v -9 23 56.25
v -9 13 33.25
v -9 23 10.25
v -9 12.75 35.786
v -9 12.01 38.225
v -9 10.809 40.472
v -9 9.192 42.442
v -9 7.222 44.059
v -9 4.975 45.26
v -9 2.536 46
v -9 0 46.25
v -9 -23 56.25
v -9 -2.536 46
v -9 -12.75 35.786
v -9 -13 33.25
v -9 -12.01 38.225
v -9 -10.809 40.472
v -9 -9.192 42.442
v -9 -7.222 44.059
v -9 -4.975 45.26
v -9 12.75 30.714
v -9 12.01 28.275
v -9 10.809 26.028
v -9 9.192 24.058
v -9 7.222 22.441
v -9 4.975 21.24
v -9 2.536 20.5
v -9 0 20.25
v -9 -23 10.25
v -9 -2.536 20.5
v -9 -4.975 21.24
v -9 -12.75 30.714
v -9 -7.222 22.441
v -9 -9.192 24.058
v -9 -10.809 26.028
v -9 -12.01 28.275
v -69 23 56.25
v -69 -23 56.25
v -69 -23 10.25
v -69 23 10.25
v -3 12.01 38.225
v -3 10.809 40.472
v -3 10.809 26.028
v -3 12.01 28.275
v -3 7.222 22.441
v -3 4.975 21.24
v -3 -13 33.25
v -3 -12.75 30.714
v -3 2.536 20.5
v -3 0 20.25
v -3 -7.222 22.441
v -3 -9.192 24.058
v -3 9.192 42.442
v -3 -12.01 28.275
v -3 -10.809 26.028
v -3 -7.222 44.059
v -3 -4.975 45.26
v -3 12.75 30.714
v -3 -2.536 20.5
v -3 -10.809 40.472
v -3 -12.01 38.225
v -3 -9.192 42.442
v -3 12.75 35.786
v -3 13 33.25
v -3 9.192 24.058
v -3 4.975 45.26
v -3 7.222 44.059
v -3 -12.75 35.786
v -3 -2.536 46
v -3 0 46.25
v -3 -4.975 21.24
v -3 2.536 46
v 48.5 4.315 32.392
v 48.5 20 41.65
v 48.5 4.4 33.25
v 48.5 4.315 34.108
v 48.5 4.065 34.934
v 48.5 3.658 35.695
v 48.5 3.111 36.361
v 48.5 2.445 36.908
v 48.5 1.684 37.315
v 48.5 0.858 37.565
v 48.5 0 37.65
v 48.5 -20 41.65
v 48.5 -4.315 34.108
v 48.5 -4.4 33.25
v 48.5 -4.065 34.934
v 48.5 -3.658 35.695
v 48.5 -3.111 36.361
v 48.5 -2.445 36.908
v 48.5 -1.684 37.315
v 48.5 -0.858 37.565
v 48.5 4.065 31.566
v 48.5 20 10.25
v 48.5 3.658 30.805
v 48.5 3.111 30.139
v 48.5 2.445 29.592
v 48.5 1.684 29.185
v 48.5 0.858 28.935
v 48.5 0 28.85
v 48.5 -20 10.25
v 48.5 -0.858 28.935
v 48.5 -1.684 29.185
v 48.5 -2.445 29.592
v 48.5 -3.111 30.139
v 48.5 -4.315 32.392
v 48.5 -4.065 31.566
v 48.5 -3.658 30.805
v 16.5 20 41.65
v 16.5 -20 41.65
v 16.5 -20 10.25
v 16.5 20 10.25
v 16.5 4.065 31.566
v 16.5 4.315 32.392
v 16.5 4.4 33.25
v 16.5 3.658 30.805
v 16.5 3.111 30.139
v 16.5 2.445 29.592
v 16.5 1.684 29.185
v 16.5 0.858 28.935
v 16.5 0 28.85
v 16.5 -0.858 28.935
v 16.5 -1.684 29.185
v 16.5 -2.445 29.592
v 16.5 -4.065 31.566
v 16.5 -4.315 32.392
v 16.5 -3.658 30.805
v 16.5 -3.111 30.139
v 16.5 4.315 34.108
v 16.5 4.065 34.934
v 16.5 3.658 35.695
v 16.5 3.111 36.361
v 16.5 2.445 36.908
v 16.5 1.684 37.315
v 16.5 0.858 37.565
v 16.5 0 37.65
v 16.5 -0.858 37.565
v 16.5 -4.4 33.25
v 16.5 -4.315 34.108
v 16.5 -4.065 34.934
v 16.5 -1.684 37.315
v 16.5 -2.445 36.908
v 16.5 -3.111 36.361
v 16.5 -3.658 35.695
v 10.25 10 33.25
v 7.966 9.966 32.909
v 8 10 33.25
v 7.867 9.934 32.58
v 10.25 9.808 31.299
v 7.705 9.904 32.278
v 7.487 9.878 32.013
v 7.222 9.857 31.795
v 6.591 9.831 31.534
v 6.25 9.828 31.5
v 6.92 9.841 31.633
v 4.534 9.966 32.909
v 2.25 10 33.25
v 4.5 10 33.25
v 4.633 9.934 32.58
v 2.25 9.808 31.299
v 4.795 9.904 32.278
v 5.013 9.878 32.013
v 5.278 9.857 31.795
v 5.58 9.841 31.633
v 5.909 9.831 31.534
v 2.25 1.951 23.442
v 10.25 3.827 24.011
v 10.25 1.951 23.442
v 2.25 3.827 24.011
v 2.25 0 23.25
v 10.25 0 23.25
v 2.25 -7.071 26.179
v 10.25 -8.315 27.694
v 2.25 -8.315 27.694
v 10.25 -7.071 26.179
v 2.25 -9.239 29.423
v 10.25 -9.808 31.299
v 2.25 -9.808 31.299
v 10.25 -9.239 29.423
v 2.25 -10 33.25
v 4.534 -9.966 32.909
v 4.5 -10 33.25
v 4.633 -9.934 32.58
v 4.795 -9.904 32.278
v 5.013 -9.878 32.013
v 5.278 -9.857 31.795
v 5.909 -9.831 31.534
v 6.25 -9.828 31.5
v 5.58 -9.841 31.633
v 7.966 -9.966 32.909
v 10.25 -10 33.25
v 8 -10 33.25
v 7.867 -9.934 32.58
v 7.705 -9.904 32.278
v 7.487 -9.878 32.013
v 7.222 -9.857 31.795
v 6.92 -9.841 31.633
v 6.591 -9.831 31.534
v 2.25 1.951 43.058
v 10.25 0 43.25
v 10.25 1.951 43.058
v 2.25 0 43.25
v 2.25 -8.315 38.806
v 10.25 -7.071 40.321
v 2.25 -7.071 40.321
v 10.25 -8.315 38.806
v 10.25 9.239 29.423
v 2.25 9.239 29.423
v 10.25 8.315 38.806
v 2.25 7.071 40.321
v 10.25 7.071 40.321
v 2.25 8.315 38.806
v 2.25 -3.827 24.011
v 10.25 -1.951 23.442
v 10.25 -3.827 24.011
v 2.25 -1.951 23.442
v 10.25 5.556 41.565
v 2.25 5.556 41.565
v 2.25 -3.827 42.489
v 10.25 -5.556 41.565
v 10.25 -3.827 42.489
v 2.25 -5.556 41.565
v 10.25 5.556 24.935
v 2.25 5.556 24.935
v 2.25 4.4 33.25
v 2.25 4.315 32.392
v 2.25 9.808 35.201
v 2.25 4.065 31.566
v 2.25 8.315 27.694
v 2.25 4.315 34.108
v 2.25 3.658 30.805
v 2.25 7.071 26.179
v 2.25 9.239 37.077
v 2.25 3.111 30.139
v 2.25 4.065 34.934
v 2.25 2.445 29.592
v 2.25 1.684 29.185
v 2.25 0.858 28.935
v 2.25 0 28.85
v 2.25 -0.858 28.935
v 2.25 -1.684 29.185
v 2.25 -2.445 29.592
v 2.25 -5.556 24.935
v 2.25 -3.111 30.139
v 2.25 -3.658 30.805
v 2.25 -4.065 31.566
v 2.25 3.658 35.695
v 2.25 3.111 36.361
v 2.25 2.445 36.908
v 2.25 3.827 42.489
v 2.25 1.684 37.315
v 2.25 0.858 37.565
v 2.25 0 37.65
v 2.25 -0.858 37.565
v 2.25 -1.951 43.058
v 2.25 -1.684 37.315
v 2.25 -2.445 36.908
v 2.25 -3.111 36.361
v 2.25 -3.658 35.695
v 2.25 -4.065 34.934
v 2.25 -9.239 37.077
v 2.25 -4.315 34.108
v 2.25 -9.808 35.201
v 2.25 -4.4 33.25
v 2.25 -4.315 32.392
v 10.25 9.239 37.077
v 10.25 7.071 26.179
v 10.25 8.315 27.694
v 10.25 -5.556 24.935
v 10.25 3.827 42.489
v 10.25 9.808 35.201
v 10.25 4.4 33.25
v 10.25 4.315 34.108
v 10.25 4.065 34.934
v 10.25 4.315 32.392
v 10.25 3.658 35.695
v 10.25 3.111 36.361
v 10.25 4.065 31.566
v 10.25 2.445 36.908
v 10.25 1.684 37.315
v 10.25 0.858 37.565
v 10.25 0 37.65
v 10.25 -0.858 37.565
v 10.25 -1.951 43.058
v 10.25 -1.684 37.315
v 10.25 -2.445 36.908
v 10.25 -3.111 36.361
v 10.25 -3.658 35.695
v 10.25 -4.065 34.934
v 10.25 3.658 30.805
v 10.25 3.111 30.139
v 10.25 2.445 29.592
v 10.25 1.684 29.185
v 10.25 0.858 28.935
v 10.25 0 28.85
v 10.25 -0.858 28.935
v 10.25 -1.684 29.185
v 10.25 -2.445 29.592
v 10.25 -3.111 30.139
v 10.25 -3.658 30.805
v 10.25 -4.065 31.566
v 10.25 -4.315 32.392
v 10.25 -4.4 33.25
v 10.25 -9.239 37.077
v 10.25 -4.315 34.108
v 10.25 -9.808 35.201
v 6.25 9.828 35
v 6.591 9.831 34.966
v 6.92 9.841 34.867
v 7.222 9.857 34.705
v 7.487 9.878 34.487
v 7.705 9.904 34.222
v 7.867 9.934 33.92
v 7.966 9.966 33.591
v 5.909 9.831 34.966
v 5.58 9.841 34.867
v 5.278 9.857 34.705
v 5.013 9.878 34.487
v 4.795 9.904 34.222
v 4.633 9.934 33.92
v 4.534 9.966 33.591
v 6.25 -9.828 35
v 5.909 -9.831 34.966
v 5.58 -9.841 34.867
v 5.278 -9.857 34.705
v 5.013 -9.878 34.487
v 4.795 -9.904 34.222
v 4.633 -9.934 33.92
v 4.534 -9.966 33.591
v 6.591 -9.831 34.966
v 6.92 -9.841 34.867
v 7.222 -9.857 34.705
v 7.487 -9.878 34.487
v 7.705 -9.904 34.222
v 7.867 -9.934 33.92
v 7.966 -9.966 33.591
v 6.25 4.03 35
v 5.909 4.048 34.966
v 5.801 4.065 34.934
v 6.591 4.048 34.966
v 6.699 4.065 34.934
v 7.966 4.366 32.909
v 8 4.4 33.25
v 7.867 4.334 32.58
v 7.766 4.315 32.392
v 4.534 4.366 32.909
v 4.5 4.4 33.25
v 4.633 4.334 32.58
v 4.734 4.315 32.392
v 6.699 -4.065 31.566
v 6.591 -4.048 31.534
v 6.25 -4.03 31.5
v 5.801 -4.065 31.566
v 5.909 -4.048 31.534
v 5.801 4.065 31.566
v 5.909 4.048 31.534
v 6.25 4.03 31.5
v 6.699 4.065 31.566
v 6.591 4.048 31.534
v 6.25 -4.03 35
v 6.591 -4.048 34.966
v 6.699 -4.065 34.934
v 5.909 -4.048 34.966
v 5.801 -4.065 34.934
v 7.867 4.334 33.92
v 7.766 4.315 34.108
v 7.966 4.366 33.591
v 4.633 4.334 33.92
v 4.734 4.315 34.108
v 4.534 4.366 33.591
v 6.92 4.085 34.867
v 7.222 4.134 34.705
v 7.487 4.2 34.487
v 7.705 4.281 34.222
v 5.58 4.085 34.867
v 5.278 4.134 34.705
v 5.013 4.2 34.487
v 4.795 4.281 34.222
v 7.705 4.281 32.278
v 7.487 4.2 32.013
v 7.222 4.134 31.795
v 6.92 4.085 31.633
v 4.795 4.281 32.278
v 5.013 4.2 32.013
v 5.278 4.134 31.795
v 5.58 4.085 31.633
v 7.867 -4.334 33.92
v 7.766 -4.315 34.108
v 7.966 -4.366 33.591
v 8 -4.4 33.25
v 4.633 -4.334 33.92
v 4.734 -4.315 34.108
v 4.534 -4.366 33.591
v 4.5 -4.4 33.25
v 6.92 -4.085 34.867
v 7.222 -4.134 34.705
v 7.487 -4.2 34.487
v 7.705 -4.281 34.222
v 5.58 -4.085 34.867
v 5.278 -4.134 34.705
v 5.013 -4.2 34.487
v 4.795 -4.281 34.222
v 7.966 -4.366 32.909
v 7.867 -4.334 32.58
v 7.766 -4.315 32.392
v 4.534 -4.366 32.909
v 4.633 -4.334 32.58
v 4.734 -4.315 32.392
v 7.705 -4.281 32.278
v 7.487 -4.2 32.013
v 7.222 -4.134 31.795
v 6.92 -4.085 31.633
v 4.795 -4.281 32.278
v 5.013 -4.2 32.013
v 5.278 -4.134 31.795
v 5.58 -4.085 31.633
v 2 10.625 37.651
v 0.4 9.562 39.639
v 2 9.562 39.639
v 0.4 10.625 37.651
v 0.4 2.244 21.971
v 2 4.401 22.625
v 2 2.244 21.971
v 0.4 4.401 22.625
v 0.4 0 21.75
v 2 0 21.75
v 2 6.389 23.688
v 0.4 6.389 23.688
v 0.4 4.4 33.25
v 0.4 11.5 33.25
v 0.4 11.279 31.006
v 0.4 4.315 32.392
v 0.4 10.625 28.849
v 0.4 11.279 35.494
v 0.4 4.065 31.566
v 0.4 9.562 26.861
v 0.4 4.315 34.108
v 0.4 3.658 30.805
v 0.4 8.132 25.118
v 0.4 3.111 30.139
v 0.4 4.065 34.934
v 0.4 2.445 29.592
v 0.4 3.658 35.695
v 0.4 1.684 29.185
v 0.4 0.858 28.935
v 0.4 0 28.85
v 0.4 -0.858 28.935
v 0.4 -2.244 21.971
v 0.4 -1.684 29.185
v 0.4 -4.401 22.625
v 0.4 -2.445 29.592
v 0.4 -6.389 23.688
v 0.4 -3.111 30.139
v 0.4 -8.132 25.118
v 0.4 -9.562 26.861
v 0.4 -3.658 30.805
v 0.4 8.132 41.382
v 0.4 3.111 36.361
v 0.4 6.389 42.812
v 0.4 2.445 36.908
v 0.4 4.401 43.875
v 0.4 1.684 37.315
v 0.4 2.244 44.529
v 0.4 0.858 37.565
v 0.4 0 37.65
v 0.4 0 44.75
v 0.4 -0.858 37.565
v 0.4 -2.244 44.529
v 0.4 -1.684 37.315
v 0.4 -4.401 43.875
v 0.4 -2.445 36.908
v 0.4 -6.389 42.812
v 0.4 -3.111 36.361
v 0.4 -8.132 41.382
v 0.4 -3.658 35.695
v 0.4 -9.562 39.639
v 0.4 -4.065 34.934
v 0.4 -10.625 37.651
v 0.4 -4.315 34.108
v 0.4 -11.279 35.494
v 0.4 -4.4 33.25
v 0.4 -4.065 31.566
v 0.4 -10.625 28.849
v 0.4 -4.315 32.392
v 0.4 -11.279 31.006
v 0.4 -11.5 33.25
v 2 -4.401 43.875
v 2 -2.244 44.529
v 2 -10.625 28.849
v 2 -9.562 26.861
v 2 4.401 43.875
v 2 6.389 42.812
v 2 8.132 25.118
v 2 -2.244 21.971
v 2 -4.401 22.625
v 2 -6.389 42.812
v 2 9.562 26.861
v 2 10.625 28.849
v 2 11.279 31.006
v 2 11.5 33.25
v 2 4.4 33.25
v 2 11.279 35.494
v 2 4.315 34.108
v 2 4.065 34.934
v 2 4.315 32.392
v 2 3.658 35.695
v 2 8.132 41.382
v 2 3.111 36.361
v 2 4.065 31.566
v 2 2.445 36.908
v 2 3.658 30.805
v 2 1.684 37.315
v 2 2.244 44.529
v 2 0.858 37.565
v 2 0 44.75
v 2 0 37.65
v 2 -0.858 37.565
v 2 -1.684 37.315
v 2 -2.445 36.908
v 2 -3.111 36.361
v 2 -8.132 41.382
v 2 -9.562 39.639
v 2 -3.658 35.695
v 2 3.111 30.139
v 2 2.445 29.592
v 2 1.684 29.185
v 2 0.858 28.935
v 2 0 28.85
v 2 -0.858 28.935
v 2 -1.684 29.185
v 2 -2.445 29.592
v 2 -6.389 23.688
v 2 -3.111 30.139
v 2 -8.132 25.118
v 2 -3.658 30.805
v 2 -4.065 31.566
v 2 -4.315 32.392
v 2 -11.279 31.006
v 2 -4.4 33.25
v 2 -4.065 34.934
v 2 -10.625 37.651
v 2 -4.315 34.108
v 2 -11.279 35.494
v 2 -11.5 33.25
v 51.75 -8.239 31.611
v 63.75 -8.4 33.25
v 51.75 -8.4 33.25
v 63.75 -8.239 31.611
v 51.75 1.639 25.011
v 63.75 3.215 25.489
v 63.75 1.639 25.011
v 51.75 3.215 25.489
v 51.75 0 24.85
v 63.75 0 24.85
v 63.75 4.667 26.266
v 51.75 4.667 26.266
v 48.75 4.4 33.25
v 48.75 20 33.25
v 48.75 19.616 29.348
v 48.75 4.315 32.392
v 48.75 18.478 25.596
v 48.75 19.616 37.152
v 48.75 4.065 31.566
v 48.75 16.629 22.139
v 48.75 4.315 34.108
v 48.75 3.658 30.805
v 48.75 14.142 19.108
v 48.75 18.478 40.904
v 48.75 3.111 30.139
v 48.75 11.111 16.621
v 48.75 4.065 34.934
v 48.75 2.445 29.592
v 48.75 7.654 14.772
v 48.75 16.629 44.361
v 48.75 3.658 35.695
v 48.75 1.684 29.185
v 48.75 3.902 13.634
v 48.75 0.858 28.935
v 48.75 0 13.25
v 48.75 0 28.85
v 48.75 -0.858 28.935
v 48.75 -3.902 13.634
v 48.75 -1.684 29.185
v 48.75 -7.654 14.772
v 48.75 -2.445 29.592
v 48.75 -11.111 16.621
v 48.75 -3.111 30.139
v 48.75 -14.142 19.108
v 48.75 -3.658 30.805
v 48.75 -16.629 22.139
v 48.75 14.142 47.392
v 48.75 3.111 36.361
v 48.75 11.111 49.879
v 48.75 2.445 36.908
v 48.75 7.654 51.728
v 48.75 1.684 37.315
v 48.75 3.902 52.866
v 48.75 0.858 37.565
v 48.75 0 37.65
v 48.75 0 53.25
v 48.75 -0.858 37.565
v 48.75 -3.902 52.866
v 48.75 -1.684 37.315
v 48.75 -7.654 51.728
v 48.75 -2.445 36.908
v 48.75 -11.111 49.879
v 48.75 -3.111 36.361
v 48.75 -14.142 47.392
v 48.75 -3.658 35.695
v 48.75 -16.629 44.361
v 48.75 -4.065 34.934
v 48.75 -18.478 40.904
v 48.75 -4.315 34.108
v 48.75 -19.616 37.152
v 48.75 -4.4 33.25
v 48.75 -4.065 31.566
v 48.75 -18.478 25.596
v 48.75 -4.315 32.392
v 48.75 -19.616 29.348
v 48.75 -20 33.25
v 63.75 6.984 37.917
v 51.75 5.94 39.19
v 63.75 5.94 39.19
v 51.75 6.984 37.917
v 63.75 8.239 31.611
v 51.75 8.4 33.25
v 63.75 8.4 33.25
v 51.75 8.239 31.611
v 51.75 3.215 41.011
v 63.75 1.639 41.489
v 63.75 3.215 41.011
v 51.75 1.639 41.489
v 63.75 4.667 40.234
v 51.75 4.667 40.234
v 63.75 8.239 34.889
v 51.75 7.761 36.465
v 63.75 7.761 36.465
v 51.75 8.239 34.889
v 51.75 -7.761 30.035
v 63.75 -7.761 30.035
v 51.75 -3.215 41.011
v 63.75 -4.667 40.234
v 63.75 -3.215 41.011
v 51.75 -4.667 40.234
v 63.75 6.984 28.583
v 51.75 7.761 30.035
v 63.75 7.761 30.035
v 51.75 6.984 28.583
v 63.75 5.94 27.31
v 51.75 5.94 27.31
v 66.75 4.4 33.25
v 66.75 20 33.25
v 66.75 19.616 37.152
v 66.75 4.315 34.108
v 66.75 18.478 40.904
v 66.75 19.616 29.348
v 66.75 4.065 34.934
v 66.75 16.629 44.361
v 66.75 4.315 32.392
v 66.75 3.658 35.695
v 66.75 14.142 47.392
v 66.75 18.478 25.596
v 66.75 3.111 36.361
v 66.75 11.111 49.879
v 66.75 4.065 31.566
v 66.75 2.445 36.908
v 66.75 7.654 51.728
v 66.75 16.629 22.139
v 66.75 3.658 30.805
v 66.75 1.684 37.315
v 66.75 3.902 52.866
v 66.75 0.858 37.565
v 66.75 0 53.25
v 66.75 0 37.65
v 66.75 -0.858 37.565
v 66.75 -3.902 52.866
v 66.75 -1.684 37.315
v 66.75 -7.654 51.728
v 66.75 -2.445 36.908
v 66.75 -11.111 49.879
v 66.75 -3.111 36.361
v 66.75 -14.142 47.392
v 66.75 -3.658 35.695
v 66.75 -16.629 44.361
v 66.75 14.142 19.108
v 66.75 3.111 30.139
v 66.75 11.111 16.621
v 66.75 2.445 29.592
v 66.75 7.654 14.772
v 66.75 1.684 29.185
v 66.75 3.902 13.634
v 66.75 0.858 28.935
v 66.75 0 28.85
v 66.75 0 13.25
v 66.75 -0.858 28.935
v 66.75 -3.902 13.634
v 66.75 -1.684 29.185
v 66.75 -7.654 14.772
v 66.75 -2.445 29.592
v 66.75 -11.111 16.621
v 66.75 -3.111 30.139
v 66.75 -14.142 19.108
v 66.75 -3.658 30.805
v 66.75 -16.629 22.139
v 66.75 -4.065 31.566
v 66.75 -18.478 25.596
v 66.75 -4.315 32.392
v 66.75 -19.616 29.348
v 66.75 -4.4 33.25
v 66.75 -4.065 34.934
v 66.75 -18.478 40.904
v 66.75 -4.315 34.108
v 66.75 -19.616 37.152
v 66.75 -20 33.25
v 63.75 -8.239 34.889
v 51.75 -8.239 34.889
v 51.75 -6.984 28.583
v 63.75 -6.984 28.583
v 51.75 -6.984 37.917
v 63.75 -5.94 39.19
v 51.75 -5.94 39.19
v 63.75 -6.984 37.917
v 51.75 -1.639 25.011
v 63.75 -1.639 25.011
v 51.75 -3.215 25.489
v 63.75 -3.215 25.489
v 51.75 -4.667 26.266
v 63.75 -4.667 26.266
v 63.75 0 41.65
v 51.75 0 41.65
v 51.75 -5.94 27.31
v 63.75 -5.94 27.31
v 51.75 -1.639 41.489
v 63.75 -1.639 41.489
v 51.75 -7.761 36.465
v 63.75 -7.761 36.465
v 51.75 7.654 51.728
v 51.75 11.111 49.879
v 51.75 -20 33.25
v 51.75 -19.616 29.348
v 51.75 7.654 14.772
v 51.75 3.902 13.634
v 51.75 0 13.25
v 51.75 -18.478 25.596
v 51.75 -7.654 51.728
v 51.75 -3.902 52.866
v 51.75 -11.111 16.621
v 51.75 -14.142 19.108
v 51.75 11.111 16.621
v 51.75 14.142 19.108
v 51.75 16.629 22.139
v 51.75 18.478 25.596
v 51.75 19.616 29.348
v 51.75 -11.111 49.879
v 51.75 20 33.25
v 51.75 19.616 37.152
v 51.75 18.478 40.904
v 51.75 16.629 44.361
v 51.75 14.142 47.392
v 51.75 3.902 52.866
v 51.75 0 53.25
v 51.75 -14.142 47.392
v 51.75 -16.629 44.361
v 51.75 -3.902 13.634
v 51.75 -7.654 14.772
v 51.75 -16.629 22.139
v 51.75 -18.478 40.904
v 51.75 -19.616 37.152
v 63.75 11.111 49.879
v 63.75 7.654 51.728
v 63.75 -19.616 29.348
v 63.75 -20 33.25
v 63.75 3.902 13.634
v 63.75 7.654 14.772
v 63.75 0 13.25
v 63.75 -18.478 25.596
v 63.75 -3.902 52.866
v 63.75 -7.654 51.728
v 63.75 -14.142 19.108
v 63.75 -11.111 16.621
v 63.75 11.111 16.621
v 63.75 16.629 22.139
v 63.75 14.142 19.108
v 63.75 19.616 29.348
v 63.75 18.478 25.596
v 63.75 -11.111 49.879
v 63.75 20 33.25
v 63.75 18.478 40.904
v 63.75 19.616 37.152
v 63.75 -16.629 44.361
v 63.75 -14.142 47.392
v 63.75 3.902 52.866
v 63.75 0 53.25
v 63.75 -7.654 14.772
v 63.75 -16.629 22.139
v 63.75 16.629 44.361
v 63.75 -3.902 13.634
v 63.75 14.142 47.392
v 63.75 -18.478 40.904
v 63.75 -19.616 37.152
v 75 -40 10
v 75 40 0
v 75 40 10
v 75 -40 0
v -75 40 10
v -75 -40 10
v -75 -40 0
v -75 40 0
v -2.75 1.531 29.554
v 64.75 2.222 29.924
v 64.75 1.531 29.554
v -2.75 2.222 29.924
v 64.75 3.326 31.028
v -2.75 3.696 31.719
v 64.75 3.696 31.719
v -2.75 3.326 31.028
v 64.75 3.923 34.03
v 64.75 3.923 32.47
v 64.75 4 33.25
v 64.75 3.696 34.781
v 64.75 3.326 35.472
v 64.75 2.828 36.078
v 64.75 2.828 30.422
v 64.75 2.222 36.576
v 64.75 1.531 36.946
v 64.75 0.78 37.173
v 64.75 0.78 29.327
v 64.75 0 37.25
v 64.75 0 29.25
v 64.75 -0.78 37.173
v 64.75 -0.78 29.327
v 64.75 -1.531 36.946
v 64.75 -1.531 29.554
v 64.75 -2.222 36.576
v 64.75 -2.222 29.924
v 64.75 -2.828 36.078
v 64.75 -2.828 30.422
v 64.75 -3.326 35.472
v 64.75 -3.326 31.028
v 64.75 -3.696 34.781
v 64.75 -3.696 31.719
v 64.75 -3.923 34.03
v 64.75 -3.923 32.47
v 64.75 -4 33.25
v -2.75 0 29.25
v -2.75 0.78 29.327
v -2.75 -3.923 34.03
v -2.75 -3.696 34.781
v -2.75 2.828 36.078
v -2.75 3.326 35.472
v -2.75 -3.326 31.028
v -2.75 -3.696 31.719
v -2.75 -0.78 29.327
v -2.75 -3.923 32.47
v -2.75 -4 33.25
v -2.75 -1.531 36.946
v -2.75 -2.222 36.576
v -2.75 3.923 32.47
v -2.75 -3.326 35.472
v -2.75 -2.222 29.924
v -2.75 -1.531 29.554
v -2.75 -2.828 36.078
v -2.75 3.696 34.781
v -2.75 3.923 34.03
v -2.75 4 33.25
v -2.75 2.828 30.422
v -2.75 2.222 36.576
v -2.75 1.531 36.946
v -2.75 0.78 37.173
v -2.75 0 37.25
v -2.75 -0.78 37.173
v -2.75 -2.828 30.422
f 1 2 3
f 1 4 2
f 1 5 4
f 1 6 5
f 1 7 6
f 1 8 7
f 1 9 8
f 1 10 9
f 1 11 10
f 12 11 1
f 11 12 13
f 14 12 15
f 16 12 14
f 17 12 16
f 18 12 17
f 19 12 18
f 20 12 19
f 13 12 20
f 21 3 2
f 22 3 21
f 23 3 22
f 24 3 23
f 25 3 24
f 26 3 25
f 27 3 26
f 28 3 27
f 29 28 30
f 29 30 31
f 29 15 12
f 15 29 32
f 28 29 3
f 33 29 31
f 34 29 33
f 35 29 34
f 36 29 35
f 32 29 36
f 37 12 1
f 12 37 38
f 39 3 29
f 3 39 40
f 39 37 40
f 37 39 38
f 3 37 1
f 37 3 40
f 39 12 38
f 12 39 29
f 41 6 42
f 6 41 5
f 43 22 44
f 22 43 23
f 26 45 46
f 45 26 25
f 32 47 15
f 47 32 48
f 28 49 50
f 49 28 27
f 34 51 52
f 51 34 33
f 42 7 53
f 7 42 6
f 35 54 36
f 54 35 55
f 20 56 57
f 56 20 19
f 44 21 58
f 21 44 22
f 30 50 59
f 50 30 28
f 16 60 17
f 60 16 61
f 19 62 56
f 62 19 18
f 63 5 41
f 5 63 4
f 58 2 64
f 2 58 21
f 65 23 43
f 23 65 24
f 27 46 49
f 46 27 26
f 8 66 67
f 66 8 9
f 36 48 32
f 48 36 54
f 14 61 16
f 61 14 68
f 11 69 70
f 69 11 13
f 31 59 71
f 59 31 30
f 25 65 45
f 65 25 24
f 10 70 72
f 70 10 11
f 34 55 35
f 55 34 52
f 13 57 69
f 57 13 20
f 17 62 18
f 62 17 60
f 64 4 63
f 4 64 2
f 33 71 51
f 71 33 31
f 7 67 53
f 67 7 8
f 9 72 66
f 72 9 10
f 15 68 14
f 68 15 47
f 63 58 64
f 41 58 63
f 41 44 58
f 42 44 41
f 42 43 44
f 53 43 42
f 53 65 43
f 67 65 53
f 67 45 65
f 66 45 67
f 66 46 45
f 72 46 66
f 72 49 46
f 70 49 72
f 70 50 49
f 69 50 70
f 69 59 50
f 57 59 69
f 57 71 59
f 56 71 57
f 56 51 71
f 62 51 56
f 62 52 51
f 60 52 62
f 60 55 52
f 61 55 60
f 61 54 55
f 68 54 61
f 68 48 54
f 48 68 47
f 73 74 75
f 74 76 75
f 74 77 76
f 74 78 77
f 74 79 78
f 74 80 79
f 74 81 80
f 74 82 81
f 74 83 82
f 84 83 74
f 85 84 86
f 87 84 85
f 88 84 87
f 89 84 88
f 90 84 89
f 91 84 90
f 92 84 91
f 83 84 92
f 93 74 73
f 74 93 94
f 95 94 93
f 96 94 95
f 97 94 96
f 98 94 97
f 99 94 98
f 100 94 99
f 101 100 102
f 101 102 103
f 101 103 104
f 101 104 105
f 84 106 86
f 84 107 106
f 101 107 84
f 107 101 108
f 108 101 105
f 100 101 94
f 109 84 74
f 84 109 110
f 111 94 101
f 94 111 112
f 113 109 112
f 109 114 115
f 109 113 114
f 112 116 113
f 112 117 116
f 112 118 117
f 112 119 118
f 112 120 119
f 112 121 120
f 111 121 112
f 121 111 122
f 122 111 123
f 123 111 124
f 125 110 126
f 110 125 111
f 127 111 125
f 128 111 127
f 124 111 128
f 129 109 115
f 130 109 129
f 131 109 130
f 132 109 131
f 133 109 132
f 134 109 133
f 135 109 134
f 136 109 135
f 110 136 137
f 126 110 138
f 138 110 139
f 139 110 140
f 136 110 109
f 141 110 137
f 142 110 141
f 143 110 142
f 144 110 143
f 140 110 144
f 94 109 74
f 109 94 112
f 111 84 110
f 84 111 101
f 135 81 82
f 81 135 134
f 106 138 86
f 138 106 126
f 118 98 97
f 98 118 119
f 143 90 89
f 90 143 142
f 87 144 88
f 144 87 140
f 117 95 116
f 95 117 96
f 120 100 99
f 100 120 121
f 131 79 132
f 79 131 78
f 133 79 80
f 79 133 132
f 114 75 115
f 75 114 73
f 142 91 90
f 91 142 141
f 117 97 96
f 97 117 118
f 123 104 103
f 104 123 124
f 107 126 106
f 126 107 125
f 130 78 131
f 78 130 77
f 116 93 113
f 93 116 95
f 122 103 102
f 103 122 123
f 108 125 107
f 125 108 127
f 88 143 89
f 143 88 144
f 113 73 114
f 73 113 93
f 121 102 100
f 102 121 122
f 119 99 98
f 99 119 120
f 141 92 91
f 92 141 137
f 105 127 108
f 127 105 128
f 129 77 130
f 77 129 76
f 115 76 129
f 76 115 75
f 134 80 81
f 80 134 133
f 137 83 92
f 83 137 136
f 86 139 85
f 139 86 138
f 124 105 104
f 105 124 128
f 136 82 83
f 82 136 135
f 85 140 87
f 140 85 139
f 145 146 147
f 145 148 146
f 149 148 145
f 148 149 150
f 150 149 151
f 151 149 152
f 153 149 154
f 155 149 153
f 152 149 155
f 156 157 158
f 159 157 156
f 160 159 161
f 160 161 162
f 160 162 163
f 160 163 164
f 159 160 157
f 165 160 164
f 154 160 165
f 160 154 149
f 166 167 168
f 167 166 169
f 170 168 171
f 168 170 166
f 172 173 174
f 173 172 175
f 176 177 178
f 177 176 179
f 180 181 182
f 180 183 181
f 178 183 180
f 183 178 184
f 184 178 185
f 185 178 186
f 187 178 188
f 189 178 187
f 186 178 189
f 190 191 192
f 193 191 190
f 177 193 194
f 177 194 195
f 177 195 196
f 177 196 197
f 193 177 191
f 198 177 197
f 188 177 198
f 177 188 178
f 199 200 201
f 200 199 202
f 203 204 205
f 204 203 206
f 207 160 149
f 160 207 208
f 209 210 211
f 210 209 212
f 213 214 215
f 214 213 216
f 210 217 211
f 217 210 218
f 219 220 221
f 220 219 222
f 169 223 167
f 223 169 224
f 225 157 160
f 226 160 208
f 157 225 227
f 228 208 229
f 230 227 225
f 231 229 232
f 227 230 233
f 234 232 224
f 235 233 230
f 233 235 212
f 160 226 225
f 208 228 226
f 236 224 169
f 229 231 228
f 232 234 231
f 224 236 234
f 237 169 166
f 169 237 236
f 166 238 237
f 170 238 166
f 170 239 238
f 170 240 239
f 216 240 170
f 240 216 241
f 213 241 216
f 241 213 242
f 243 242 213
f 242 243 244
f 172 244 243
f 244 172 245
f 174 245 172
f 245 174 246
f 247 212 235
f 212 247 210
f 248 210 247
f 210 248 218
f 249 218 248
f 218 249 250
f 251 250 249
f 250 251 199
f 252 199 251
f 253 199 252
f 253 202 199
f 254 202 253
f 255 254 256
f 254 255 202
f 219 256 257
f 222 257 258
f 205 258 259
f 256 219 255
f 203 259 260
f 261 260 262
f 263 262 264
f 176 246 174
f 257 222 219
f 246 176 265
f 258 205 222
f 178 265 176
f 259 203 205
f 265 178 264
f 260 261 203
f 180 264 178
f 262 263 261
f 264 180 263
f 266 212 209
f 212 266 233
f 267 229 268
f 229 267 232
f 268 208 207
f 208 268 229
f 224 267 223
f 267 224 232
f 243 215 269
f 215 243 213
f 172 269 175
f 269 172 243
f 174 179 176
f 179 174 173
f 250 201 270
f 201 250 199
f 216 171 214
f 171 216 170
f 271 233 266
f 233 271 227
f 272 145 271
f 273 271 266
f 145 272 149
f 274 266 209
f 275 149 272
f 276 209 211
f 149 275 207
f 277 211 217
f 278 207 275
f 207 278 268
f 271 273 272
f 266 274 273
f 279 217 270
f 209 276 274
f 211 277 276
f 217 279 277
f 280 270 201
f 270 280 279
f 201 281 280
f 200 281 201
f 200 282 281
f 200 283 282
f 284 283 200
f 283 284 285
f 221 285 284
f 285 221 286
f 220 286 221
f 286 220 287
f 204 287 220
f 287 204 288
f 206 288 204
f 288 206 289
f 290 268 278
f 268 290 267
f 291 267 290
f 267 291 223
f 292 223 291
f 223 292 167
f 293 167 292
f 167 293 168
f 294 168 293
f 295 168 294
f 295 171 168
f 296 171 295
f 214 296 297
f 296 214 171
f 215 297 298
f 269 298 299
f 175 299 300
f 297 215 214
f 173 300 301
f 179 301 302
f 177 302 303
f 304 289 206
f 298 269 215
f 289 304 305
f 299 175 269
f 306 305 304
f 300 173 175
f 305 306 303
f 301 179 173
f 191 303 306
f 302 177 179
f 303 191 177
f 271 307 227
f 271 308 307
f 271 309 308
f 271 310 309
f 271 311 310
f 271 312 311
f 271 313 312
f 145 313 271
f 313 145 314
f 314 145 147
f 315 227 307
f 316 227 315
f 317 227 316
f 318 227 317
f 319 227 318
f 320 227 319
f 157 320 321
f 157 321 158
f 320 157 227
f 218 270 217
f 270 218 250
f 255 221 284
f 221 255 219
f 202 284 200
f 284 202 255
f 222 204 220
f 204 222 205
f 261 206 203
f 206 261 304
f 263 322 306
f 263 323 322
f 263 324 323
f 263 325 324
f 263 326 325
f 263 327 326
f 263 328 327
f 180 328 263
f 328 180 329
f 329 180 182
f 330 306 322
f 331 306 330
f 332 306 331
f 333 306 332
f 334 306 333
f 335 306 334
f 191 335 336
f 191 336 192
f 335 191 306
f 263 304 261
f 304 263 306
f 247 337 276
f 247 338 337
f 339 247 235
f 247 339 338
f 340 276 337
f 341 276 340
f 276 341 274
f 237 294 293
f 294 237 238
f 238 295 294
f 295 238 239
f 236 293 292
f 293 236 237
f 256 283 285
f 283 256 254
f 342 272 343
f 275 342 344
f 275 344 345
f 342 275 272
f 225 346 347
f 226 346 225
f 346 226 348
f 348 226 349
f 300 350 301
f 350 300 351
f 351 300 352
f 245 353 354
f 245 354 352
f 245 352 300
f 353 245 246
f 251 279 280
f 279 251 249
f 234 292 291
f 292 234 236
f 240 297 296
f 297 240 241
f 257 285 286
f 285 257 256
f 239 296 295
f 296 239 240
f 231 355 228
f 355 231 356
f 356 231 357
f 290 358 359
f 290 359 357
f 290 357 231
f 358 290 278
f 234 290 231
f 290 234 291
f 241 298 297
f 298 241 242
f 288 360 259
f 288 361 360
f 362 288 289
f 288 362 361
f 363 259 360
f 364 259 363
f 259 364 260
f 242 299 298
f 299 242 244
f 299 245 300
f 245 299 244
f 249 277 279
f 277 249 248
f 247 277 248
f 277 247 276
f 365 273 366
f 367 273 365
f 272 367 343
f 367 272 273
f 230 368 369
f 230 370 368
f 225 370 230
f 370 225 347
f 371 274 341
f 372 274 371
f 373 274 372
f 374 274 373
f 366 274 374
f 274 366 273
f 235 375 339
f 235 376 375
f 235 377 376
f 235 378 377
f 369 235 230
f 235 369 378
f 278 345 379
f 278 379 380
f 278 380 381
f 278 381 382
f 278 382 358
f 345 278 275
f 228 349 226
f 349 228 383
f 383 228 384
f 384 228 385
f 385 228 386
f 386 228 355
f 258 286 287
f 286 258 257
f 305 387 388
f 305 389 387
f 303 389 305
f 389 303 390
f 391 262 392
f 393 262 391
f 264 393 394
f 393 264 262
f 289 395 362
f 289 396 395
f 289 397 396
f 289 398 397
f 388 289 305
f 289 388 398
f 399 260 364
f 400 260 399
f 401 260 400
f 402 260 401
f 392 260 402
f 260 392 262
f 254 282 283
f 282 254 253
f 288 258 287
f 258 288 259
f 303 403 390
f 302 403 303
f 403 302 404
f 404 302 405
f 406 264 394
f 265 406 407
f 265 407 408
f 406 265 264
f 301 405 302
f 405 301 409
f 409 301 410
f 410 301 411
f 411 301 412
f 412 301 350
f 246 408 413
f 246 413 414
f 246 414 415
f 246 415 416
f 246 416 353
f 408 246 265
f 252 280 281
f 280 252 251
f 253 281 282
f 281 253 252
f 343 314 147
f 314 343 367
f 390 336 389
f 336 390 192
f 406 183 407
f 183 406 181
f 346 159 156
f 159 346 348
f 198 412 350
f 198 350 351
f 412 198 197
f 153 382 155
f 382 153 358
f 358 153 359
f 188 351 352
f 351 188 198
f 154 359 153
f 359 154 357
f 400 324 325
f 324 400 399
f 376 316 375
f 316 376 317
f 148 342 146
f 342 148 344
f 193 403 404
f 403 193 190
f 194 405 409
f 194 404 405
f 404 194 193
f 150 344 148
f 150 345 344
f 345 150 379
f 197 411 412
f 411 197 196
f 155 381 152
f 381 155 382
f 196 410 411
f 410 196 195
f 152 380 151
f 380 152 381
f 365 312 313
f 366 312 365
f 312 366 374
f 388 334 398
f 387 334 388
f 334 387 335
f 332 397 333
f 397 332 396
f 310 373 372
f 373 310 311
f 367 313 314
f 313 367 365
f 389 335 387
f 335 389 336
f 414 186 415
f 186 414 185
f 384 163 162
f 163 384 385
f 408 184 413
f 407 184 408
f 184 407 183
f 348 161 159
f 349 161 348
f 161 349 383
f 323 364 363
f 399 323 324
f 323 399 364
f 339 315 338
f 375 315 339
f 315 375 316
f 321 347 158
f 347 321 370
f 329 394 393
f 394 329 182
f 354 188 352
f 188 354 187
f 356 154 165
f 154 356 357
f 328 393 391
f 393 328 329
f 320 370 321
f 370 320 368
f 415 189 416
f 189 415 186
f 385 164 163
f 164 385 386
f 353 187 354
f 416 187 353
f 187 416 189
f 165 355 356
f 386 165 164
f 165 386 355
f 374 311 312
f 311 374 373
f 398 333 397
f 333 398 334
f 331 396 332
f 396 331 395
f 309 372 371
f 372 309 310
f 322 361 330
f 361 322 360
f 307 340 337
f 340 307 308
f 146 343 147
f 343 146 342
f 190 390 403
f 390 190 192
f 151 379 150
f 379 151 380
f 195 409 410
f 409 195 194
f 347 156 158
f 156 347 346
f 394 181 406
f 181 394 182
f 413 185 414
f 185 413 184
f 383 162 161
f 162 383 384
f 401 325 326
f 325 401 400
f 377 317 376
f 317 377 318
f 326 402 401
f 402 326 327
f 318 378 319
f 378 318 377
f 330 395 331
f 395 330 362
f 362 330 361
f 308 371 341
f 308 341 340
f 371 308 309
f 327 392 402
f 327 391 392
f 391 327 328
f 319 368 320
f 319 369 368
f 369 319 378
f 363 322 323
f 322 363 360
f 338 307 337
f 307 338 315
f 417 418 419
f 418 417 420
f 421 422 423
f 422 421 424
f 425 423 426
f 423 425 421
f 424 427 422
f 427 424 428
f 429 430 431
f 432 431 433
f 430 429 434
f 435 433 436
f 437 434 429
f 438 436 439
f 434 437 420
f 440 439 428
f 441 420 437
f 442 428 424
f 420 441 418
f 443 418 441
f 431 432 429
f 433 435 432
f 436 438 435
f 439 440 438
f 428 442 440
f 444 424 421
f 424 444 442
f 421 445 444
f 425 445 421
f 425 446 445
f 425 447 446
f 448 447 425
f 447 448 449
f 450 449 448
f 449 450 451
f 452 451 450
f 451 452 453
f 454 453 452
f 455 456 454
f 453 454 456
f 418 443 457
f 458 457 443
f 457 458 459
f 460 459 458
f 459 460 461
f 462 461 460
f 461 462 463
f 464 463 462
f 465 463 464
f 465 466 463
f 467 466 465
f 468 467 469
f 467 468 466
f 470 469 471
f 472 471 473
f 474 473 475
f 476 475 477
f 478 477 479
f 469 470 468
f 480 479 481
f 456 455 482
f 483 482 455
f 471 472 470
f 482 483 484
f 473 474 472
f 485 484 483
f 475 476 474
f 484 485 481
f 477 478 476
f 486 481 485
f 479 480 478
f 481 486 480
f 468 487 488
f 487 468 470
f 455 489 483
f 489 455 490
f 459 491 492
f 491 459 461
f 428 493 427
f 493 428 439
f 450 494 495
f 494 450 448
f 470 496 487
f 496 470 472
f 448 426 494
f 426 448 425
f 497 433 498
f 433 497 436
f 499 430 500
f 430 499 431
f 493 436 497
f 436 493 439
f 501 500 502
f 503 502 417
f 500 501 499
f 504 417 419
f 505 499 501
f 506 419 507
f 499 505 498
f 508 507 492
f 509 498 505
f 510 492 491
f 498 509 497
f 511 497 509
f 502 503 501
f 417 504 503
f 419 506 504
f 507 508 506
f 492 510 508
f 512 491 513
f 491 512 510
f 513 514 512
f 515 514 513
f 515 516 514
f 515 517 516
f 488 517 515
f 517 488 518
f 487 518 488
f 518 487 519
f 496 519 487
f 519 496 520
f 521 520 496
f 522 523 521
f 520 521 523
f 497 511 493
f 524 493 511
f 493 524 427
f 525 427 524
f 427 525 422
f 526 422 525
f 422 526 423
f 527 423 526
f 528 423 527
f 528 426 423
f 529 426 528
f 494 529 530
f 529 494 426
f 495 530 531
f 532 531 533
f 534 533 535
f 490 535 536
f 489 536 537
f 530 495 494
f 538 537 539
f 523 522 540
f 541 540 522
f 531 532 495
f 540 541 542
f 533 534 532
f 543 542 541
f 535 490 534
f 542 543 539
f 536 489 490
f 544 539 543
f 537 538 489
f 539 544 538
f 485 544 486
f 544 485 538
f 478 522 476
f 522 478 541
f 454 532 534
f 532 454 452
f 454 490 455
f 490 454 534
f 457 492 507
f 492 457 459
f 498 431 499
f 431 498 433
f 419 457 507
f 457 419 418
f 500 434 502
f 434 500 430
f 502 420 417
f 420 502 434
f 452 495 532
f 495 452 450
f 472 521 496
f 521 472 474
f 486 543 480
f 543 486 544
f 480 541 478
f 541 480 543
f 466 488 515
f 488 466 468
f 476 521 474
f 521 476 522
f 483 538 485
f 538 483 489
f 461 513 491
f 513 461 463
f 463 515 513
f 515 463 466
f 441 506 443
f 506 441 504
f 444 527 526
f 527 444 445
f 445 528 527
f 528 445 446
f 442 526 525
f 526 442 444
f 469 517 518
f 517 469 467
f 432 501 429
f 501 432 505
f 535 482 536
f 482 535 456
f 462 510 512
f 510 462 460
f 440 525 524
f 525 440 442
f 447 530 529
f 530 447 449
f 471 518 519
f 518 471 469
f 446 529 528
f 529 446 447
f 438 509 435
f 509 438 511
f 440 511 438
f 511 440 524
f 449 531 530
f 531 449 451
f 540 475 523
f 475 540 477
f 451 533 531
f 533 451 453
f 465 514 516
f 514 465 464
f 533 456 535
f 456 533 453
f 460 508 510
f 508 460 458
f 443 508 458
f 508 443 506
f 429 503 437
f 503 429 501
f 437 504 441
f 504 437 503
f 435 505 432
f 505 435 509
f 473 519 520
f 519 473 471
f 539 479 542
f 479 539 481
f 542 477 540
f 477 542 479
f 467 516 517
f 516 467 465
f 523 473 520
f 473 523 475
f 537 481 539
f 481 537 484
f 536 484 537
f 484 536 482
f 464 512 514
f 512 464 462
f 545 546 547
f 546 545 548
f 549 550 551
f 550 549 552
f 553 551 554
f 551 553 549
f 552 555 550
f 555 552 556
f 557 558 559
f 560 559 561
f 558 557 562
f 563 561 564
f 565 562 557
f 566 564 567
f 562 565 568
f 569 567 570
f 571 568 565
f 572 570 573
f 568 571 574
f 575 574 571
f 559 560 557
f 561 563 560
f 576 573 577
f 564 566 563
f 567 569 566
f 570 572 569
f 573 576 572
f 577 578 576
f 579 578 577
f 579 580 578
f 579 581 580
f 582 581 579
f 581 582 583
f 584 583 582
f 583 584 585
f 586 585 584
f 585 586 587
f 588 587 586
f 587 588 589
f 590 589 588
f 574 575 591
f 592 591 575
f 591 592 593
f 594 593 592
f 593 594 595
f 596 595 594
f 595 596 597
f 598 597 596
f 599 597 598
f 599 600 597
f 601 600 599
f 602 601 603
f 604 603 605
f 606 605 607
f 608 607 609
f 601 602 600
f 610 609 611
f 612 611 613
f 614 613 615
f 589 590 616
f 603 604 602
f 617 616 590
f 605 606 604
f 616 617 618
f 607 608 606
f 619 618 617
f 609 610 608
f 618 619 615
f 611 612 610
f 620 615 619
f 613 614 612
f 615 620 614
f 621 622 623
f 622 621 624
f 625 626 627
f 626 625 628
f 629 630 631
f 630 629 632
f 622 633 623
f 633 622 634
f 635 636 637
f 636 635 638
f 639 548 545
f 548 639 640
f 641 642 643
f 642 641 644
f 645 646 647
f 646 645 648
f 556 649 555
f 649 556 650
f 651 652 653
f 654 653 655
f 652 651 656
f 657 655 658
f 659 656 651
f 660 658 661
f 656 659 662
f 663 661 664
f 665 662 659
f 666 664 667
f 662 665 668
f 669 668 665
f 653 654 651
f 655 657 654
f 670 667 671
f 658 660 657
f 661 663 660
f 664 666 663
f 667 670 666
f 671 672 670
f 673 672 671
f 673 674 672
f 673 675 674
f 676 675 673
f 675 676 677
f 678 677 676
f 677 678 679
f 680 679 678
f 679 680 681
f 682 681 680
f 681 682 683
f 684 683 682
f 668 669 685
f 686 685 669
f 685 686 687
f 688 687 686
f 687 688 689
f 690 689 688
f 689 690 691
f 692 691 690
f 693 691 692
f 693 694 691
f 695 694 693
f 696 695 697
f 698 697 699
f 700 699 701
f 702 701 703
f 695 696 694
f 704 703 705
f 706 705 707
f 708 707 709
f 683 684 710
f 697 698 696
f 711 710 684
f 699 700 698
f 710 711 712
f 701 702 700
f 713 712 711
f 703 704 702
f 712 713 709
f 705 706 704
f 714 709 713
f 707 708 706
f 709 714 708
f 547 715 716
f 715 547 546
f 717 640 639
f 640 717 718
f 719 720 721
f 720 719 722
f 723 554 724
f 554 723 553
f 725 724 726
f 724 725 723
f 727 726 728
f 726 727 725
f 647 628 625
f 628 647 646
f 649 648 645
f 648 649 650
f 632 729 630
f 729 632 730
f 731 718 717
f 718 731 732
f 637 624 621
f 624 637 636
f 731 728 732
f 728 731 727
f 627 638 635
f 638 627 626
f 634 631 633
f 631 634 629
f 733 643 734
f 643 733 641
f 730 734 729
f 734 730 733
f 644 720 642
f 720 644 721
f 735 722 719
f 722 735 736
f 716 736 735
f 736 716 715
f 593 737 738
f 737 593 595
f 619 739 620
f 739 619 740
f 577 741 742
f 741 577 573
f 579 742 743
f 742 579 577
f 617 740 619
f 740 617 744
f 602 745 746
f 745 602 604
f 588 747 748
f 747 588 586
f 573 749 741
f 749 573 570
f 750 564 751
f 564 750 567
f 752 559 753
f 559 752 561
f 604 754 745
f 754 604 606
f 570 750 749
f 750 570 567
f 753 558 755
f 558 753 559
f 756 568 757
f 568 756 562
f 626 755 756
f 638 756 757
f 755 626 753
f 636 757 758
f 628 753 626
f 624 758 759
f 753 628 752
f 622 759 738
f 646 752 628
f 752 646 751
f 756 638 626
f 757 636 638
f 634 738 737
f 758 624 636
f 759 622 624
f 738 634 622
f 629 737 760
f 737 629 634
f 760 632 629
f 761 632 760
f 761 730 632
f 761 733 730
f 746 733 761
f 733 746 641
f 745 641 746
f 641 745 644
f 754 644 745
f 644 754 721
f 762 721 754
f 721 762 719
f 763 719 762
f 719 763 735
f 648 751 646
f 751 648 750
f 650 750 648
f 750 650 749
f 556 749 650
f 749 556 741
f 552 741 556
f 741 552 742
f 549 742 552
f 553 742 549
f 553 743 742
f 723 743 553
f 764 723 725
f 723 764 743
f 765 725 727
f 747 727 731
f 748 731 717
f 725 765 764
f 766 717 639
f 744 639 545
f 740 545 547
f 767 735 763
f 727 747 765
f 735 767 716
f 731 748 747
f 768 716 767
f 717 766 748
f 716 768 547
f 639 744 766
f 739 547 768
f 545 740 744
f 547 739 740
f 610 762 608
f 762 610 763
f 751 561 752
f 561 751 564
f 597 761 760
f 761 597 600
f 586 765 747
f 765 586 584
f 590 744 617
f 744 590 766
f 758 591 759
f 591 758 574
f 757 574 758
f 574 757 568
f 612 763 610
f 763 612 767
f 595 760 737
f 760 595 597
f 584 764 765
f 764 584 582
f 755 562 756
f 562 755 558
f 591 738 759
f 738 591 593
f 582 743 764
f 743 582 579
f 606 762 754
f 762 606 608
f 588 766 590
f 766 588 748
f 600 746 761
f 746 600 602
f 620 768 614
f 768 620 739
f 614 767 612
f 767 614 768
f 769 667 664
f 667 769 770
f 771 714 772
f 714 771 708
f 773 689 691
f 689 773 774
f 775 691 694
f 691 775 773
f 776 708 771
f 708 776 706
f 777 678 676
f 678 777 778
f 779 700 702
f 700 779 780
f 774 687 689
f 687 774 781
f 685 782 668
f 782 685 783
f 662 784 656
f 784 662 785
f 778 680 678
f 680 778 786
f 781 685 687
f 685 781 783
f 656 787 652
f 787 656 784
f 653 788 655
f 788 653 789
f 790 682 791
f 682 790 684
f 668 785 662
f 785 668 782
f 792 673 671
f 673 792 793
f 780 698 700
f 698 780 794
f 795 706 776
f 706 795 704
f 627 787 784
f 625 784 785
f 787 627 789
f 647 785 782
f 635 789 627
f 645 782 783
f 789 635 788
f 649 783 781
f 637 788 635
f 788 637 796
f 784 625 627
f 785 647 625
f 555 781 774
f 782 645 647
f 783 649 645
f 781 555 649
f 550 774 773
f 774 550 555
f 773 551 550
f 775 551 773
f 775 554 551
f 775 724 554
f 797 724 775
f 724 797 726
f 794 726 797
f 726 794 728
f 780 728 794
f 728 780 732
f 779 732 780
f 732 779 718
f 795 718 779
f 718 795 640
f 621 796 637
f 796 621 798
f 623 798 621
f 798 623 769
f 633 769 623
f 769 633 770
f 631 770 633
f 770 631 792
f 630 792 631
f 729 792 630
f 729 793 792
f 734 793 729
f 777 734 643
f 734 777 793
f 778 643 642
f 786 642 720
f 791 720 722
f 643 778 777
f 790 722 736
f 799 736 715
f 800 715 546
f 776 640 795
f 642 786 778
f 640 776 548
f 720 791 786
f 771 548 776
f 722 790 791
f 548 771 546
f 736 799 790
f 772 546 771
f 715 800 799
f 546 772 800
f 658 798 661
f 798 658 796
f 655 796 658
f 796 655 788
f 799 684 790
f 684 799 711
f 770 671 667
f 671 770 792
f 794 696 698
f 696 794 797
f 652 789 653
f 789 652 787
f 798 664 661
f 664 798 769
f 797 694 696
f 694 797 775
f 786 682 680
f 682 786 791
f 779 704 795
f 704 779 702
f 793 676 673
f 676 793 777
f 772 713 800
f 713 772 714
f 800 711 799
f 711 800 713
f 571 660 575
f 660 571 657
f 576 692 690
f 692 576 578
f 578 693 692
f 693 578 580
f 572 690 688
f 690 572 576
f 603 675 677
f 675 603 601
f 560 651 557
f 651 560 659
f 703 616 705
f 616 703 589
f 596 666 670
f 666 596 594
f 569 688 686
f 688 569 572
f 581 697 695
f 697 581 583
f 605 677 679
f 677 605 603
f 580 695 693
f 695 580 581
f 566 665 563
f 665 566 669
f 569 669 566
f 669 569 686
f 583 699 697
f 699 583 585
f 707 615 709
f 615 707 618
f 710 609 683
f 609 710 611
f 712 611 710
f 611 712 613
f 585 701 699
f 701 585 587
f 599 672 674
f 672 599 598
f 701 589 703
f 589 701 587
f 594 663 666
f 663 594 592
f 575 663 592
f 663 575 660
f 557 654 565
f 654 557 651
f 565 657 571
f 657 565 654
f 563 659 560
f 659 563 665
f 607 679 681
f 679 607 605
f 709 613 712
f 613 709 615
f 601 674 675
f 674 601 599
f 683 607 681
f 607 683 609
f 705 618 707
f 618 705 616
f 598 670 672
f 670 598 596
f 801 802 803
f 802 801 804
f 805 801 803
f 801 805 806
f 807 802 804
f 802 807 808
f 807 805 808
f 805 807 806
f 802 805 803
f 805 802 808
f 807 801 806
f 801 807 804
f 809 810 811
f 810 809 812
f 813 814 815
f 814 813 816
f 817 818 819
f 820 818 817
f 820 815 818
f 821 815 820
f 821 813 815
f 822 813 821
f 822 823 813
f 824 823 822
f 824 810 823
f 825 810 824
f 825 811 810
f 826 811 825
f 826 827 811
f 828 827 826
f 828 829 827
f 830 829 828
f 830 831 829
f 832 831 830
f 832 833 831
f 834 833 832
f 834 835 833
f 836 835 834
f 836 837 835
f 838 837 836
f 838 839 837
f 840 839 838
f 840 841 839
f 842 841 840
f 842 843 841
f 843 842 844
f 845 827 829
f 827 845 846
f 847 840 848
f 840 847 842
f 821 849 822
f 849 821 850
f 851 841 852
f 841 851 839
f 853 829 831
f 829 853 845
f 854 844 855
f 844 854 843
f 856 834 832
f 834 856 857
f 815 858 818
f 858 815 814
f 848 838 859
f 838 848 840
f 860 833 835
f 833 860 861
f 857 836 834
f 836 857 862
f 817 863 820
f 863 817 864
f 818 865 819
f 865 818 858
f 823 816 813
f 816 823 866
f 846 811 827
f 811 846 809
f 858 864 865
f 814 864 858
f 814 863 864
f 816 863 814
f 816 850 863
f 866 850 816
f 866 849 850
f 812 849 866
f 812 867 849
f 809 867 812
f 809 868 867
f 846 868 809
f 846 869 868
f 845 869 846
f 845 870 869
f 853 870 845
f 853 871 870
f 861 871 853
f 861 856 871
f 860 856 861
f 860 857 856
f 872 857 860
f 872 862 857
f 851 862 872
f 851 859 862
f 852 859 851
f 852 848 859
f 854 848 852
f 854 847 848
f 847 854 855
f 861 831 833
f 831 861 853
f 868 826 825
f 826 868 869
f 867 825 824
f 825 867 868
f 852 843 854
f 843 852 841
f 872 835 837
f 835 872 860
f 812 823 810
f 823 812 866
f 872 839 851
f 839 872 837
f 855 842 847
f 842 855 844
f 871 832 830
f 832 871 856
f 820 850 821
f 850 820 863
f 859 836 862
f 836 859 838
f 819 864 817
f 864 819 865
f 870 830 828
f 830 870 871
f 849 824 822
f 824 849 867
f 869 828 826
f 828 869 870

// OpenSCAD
$fn = 32;

// ------------------------------------------------------------------------
// Motor drive station: motor 60 x 46 mm, shaft d8, pulley d40
// Every part is its own module, assembly() places every instance.
// ------------------------------------------------------------------------

// --- part 1 ---
module station_bed() {
  difference() {
    translate([-75, -40, 0]) cube([150, 80, 10]);
  }
}

// --- part 2 ---
module drive_motor() {
  union() {
    translate([-30, -23, 0]) cube([60, 46, 46]);
    translate([33, 0, 23]) rotate([0, 90, 0]) cylinder(h = 6, d = 26, center = true);
  }
}

// --- part 3 ---
module pillow_block() {
  difference() {
    translate([-16, -20, 0]) cube([32, 40, 31.4]);
    translate([0, 0, 23]) rotate([0, 90, 0]) cylinder(h = 34, d = 8.8, center = true);
  }
}

// --- part 4 ---
module drive_shaft() {
  translate([0, 0, -33.75]) cylinder(h = 67.5, d = 8);
}

// --- part 5 ---
module shaft_collar() {
  difference() {
    cylinder(h = 8, d = 20);
    translate([0, 0, -1]) cylinder(h = 10, d = 8.8);
    translate([0, 0, 4]) rotate([90, 0, 0]) cylinder(h = 22, d = 3.5, center = true);
  }
}

// --- part 6 ---
module collar_washer() {
  difference() {
      translate([0, 0, 0]) cylinder(h = 1.6, d = 23);
      translate([0, 0, -1]) cylinder(h = 3.6, d = 8.8);
    }
}

// --- part 7 ---
module drive_pulley() {
  difference() {
    union() {
      cylinder(h = 18, d = 16.8);
      cylinder(h = 3, d = 40);
      translate([0, 0, 15]) cylinder(h = 3, d = 40);
    }
    translate([0, 0, -1]) cylinder(h = 20, d = 8.8);
  }
}

// --- assembly ---
module assembly() {
  color([0.80, 0.24, 0.20]) translate([0, 0, 0]) rotate([0, 0, 0]) station_bed();
  color([0.20, 0.45, 0.75]) translate([-39, 0, 10.25]) rotate([0, 0, 0]) drive_motor();
  color([0.25, 0.62, 0.32]) translate([32.5, 0, 10.25]) rotate([0, 0, 0]) pillow_block();
  color([0.92, 0.70, 0.18]) translate([31, 0, 33.25]) rotate([0, 90, 0]) drive_shaft();
  color([0.58, 0.35, 0.70]) translate([2.25, 0, 33.25]) rotate([0, 90, 0]) shaft_collar();
  color([0.16, 0.66, 0.66]) translate([0.4, 0, 33.25]) rotate([0, 90, 0]) collar_washer();
  color([0.85, 0.48, 0.18]) translate([48.75, 0, 33.25]) rotate([0, 90, 0]) drive_pulley();
}

assembly();
